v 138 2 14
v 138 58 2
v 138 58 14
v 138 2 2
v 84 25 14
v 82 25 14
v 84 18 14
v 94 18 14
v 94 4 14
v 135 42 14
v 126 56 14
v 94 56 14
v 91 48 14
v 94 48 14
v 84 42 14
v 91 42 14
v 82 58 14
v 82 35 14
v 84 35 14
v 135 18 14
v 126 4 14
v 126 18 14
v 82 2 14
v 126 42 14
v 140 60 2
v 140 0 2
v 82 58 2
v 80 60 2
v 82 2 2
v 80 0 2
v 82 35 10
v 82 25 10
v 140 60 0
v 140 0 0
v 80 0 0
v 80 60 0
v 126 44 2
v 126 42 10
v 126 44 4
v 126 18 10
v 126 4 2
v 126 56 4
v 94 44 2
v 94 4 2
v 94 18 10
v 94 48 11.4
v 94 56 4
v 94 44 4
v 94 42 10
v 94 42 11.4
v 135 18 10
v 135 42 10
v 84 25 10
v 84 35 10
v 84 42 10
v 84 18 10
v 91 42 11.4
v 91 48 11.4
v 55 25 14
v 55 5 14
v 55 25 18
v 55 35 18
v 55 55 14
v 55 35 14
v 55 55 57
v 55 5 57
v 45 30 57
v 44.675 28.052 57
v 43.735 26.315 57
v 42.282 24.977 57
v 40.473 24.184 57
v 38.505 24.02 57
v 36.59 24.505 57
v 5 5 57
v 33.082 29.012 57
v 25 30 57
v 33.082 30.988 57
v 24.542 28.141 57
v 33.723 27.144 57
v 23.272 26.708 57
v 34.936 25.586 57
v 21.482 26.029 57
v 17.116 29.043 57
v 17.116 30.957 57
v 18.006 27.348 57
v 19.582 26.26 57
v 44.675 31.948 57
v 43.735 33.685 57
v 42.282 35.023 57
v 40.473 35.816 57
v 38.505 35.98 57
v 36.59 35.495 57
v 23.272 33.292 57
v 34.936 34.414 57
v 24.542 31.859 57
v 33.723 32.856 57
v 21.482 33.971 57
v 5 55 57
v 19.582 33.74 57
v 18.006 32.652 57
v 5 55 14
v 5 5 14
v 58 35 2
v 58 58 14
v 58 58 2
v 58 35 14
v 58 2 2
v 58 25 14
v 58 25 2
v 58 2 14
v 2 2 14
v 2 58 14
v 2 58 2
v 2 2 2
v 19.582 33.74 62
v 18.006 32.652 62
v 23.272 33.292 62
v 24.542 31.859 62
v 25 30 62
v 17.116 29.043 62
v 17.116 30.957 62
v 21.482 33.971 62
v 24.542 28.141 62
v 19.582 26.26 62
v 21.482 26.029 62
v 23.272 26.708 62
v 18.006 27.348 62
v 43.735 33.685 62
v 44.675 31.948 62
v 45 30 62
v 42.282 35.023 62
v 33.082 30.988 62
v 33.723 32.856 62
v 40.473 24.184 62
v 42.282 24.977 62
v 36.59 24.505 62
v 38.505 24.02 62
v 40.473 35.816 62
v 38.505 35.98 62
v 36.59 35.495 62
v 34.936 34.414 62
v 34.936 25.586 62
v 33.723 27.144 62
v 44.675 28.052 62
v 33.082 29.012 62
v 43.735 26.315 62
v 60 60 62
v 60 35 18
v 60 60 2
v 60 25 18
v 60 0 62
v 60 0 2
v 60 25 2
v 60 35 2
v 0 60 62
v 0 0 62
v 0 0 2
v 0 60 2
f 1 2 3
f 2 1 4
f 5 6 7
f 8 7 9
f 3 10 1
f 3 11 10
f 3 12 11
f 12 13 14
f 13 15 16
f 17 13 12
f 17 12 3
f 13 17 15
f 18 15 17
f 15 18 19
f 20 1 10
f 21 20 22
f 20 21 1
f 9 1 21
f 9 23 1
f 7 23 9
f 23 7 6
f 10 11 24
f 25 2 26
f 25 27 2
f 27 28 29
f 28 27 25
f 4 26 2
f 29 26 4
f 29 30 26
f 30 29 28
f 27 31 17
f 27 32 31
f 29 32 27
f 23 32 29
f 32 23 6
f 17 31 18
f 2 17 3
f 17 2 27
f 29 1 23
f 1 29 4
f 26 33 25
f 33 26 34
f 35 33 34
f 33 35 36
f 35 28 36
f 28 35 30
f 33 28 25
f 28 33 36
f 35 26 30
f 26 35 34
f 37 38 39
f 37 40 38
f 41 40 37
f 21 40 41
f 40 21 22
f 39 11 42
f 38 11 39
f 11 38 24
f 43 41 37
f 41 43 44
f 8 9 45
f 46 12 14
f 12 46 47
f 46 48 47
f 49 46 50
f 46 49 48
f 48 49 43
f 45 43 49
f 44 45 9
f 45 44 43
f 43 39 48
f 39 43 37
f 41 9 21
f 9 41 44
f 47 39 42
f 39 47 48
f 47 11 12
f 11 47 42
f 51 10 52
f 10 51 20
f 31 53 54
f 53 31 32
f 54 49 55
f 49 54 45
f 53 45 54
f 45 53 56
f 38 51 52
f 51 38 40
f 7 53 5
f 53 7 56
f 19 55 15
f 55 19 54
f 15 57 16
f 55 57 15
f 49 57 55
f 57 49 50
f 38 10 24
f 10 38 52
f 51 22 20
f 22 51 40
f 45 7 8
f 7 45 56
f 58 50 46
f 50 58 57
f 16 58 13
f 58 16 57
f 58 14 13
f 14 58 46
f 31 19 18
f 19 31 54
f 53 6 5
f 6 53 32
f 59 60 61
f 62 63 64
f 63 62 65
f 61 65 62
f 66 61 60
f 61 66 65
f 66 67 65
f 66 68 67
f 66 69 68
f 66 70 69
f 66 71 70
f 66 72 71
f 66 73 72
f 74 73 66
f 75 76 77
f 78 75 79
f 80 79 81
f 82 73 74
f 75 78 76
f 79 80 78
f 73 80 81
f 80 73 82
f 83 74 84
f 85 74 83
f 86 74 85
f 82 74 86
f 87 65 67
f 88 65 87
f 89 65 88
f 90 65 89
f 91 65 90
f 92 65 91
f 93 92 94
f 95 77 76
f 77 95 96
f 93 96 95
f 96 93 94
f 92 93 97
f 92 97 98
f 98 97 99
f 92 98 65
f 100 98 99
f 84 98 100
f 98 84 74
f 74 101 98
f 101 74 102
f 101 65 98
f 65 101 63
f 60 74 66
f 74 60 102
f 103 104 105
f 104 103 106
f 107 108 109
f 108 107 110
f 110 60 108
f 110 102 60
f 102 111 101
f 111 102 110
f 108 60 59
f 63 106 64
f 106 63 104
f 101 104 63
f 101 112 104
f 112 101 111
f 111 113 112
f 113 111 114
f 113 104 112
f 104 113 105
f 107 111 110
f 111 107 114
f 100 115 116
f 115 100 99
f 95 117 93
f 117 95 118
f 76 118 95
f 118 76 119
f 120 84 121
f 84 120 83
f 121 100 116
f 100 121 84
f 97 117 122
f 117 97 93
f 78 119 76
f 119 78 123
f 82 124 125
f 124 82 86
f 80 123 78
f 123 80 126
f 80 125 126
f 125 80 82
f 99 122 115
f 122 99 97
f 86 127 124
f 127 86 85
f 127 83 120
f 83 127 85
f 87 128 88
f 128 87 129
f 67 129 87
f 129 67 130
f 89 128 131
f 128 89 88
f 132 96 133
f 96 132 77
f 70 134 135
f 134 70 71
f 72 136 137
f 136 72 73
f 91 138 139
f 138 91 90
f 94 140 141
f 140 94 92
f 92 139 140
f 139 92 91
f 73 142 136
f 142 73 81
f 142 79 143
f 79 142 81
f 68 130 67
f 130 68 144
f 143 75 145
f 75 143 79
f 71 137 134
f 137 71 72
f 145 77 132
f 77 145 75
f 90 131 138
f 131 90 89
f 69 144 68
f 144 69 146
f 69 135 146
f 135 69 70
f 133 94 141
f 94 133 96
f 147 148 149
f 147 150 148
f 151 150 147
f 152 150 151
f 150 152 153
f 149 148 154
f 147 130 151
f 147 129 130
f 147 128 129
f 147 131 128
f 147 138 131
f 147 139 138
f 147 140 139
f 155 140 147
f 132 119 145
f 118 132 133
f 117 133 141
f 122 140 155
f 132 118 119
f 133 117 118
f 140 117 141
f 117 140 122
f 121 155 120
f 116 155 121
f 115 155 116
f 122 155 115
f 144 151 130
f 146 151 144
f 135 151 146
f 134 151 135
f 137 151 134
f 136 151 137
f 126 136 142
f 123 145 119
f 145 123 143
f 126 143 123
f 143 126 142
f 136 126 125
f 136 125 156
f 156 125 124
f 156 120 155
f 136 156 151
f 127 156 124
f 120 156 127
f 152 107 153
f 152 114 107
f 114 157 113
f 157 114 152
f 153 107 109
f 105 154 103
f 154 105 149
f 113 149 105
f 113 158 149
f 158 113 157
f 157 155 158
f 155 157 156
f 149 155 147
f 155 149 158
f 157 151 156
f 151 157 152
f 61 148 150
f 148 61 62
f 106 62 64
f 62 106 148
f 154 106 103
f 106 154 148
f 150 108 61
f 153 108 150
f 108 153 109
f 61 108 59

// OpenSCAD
module bottom_case(){
    difference(){
        union(){
            translate([2,2,2]) cube([56,56,12]);
            base();
        }
        
        translate([14,4,2]) bottom_space();      
    }
}
module bottom_space(){
    union(){
        batt_space();
        translate([-10,14,8])board_space();
    }
}
module board_space(){
    union(){
        cube([51, 24,15]);
        translate([7, 15, 1.4])cube([8,15,16]);
        translate([-5,7,0])cube([10,10,8]); //add charging hole
    }
    
}
module batt_space(){
    cube([32,40,16]);
    translate([0,39,2])cube([32,13,16]);
}
module base(){
    cube([60,60,2]);
}

module top(){
    difference(){
        cube([60,60,60]);
        union(){
            translate([5,5,-1])cube([50,50,56]);
            translate([2,2,-1])cube([56,56,13]);
            translate([21,30,55])cylinder(h=20, r=4, center=true);
            translate([39,30,55])cylinder(h=20, r=6, center=true);
        }
        translate ([55,25,-1])cube([10,10,17]); //add charging hole
    }
}


translate([80,0,0])bottom_case();
translate([0,0,2])top();
